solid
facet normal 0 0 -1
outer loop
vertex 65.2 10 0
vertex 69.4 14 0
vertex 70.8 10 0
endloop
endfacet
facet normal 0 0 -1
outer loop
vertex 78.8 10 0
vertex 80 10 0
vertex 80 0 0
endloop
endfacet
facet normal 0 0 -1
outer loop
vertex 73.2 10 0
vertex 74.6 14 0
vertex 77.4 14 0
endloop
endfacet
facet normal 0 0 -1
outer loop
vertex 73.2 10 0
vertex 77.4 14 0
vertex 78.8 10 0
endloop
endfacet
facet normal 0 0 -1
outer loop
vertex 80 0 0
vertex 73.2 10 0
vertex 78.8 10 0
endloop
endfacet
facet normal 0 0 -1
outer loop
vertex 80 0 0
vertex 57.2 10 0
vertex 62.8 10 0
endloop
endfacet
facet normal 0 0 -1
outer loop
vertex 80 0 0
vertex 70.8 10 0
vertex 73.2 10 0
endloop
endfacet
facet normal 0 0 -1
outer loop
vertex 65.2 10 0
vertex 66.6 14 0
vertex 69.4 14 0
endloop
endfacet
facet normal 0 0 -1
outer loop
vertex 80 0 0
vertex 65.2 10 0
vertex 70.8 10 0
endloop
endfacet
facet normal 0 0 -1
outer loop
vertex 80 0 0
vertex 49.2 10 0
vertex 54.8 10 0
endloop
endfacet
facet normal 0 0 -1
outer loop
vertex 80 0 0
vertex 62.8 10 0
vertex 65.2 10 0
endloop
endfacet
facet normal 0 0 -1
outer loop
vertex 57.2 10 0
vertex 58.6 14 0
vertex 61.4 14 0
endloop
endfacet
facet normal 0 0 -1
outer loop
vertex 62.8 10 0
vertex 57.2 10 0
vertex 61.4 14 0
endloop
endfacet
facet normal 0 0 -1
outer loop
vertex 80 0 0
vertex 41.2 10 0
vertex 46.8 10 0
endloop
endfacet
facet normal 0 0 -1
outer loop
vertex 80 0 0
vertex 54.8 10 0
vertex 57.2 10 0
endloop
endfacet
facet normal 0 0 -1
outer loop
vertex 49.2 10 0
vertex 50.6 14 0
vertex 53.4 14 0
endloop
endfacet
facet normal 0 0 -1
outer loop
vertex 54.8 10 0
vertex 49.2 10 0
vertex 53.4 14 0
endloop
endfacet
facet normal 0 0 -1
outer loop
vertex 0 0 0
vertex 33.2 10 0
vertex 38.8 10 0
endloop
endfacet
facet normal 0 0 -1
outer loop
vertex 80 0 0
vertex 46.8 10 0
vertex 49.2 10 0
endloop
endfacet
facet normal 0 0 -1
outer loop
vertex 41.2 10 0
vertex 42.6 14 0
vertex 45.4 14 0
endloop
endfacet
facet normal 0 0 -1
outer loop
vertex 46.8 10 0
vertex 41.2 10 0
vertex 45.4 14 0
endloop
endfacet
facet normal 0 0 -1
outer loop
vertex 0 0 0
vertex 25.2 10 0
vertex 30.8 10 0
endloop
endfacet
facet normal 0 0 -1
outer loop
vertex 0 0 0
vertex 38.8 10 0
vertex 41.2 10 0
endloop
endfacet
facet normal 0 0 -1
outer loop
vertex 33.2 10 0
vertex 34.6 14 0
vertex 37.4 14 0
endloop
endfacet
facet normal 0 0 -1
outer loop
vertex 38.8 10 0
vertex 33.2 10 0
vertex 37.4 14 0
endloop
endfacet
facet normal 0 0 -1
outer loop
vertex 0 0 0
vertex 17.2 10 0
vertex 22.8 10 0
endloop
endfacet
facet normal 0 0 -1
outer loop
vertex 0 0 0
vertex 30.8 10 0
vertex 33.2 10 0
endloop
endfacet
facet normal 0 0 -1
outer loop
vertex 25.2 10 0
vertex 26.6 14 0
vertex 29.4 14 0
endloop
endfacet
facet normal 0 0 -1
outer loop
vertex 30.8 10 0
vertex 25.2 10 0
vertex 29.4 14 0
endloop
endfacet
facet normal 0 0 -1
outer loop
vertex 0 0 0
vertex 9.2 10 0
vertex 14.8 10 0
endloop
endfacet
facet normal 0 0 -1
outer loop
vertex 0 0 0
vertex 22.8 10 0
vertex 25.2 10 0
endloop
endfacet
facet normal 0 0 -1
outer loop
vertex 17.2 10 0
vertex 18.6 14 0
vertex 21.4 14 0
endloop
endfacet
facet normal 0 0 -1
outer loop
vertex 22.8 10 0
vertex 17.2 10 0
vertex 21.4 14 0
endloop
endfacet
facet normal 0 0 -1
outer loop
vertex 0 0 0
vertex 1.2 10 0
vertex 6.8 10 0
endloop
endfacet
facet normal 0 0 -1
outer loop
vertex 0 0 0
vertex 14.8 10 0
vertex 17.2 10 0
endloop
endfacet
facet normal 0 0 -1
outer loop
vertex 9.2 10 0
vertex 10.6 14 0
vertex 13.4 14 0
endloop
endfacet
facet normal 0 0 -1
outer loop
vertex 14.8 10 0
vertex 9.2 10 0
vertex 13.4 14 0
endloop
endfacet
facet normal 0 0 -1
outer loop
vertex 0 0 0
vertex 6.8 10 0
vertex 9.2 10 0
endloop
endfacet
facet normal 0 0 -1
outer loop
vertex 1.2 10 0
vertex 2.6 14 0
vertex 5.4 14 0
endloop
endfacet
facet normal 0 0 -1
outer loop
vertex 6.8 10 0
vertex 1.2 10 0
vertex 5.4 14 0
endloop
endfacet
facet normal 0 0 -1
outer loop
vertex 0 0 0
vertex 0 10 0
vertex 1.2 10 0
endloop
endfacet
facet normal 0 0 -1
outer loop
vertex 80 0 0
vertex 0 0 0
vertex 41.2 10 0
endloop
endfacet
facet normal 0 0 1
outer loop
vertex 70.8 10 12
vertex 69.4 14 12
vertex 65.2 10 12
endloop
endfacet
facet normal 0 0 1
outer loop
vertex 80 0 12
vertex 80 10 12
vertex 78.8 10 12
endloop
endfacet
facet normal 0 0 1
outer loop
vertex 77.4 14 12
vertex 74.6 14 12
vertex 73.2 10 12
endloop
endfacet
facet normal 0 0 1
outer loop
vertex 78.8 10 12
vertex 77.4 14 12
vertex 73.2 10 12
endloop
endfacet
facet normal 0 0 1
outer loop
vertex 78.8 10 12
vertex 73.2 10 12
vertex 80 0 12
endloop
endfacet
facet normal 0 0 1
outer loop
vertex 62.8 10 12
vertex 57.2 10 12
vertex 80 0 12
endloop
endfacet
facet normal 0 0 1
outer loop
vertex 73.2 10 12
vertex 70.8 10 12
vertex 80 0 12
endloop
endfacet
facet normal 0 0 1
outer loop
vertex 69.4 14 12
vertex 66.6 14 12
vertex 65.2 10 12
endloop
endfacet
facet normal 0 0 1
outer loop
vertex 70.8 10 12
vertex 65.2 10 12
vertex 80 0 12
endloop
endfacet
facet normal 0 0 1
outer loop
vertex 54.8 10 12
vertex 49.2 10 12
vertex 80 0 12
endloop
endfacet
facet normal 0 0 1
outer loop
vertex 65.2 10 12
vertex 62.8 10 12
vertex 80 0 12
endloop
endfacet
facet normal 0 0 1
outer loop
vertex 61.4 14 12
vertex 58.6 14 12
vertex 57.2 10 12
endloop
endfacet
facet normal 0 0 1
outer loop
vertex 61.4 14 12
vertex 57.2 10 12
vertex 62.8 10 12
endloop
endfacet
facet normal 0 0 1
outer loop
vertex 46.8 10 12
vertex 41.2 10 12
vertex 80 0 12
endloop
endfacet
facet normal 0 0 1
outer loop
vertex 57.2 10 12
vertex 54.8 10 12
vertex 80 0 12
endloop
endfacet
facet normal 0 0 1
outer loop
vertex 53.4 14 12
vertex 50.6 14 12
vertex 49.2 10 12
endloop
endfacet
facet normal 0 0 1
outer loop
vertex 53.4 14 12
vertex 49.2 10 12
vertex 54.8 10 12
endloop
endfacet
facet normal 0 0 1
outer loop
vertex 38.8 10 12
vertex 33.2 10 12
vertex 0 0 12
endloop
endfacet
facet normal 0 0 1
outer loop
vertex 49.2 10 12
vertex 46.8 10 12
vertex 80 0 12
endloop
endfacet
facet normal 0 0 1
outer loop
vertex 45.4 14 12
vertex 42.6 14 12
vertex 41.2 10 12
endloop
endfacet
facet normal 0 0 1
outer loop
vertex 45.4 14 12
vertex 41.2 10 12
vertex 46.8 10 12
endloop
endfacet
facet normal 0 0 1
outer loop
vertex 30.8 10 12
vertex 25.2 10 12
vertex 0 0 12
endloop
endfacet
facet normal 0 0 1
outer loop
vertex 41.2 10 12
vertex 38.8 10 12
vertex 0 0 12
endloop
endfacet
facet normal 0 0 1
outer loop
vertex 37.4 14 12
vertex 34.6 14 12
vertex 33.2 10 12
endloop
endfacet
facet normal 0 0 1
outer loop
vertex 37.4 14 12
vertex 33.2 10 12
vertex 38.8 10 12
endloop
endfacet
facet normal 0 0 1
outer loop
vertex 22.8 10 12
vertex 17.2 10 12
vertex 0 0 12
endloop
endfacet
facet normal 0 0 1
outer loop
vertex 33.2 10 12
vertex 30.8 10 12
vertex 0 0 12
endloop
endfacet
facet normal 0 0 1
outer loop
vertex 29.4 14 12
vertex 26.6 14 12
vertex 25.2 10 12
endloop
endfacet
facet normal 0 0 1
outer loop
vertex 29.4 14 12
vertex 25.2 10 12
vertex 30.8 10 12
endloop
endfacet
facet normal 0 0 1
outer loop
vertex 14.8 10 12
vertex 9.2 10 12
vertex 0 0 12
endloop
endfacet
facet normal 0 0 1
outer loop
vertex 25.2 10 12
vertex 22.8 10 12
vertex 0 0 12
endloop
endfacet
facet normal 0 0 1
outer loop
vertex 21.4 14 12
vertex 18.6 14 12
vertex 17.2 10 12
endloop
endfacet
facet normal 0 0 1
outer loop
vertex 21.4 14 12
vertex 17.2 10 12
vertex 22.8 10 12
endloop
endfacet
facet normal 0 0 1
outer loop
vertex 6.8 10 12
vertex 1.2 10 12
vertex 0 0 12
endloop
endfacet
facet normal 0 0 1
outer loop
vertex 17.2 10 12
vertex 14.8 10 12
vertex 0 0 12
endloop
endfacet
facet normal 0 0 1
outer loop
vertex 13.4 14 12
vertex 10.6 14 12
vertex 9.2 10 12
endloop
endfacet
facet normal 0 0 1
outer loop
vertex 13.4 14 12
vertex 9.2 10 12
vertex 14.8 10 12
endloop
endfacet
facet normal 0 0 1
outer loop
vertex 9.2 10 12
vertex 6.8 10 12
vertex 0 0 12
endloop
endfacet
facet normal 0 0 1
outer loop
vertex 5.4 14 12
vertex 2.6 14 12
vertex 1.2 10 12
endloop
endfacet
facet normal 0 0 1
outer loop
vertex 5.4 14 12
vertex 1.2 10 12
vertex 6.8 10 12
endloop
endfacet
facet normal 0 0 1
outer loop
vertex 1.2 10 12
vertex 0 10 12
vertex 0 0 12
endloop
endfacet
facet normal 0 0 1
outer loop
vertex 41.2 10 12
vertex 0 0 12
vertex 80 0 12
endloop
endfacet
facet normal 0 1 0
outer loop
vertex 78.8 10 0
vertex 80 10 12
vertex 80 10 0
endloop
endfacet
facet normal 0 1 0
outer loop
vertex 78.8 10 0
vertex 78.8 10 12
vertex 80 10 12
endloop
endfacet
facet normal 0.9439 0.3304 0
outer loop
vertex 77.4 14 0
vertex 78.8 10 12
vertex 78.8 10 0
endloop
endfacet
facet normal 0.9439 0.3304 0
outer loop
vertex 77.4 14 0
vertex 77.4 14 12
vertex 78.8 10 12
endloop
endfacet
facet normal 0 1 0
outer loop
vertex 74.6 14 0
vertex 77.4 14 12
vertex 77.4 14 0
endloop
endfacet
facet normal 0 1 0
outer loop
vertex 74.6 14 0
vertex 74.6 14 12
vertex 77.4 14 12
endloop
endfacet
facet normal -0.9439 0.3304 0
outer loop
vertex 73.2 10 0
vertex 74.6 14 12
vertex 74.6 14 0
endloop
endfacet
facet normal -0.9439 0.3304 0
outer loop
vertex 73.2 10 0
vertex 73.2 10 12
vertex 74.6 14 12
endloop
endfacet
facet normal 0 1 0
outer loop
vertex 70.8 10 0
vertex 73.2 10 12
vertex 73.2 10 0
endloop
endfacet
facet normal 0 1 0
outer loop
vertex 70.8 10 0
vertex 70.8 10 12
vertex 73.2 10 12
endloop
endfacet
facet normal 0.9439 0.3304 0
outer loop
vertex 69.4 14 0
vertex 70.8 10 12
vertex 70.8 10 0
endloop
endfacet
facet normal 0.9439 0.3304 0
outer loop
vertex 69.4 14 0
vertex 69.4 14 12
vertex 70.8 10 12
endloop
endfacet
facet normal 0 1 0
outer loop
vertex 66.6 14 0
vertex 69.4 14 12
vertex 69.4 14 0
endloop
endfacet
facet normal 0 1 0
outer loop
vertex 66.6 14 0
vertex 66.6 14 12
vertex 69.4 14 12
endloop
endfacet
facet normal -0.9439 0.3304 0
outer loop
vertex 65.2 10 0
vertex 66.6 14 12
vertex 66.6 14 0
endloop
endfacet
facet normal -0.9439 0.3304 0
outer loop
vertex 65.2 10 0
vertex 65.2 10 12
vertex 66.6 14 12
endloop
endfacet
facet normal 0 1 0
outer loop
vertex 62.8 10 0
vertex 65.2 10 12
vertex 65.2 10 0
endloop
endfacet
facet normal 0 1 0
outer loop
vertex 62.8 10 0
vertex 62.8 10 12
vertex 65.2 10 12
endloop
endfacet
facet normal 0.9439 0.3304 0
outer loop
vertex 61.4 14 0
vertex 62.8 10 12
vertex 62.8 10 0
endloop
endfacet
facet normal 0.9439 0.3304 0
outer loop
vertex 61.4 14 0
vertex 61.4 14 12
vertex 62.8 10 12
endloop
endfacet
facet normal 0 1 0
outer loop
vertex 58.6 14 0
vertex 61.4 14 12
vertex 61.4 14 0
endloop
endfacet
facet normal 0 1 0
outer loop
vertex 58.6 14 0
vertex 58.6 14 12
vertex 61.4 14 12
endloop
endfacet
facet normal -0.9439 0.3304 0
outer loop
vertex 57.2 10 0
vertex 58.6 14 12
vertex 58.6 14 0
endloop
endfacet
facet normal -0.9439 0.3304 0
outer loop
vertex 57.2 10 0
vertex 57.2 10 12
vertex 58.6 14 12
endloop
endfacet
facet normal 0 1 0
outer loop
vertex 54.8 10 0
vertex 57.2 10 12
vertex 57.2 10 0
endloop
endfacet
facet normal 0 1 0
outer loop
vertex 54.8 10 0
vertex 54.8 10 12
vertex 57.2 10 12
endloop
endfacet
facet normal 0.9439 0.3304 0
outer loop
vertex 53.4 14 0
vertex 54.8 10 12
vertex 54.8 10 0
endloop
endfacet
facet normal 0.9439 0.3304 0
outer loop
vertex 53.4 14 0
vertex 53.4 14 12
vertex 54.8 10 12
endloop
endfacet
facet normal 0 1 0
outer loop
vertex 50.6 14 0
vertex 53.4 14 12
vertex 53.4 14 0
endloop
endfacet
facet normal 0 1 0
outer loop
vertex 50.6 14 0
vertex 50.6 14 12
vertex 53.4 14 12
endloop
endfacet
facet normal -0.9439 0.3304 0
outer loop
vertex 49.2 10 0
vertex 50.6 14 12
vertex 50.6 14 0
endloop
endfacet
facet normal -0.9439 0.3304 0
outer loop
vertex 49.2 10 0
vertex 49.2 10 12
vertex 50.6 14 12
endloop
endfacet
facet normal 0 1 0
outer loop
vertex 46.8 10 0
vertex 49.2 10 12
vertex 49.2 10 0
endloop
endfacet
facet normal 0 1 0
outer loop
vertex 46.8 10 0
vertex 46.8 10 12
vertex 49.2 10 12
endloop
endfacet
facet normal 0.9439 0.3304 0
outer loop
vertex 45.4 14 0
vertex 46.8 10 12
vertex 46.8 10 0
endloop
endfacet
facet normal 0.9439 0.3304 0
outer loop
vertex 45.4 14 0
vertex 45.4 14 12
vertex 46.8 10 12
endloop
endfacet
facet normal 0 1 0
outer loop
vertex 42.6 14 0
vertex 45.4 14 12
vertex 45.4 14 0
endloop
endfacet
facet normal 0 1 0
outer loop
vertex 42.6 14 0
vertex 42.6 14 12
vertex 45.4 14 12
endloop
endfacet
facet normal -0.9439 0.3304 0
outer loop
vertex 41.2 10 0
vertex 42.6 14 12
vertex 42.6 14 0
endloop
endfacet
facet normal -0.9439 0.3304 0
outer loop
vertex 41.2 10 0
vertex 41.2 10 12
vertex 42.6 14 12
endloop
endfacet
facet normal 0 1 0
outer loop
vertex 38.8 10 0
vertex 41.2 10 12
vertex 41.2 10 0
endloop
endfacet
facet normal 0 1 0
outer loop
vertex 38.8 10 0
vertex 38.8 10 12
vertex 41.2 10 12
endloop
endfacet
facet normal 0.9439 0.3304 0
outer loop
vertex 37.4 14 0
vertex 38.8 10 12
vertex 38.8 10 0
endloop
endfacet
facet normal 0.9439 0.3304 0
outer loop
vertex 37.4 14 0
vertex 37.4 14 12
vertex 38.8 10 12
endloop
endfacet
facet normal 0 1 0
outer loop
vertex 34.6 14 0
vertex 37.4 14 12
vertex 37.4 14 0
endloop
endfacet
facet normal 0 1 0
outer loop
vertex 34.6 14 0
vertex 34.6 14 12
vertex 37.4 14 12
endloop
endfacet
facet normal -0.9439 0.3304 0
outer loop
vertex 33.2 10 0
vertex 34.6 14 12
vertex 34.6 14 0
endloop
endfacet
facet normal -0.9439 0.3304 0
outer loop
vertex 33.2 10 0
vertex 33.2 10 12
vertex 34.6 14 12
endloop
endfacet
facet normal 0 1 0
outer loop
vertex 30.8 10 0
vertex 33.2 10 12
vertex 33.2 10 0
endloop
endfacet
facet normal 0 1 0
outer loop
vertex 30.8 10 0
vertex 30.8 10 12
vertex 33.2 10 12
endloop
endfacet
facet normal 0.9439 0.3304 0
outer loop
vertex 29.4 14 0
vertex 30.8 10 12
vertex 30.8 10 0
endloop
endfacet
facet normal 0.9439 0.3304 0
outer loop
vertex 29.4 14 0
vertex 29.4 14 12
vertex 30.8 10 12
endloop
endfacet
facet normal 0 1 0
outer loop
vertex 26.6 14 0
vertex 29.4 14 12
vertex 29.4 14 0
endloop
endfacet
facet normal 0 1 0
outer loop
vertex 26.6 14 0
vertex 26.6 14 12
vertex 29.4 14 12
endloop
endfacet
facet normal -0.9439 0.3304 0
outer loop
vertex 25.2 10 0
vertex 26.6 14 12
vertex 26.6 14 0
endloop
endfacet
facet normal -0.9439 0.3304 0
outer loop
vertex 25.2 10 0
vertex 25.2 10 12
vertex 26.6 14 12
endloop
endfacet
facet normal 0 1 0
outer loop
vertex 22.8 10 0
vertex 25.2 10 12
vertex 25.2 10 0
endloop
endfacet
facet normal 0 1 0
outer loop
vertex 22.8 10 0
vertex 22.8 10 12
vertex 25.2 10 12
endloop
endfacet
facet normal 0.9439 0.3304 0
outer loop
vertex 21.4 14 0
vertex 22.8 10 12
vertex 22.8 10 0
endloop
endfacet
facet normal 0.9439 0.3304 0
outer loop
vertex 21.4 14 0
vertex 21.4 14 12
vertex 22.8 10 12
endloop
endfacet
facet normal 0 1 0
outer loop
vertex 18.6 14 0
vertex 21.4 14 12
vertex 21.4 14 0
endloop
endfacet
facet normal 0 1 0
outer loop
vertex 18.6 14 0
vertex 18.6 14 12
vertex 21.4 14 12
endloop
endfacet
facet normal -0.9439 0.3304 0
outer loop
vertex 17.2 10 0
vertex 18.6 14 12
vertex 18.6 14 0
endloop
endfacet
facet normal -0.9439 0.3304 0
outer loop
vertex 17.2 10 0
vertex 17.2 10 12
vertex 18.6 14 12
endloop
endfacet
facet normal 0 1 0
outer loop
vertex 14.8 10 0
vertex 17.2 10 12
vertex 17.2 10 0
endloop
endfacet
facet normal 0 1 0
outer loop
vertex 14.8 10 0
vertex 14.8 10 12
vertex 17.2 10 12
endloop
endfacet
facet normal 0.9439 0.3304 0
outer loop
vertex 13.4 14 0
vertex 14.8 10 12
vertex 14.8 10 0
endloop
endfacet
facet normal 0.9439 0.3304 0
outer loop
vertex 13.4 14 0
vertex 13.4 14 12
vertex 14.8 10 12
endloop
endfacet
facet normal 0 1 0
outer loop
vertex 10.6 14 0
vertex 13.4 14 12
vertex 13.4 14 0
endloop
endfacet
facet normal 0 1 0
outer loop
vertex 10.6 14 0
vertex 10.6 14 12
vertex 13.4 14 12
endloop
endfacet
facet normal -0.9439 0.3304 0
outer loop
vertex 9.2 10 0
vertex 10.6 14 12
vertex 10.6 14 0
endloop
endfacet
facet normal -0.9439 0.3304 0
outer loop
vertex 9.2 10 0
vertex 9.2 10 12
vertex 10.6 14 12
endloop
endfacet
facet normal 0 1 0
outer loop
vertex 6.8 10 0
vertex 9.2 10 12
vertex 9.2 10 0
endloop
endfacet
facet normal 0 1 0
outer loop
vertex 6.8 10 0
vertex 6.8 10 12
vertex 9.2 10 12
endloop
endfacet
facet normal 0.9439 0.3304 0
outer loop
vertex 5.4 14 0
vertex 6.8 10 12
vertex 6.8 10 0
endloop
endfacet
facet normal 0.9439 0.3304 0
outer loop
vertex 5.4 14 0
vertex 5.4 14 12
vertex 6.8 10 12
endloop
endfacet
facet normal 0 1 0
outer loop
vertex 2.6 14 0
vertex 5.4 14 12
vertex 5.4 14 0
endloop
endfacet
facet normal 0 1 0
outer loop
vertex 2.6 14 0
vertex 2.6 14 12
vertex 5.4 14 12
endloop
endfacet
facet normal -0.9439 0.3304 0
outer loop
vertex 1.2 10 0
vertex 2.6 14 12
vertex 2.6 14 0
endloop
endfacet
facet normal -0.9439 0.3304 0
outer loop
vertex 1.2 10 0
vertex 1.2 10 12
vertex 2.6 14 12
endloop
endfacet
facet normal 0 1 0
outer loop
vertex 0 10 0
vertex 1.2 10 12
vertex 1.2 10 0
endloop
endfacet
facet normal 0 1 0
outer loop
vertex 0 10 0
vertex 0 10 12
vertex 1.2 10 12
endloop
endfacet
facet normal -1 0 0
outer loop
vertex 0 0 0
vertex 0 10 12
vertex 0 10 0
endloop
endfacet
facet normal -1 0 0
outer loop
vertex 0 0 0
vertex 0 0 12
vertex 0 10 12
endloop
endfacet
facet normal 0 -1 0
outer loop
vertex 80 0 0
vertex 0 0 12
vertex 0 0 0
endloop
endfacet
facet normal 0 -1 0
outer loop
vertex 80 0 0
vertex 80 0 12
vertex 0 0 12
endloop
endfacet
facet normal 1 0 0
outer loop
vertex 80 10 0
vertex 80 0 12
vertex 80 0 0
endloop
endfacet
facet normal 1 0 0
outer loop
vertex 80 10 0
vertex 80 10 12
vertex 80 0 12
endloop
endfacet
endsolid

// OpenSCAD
$fn = 32;

// ----------------------------------------------------------------------
// Gear rack: 10 teeth, pitch 8 mm
// ----------------------------------------------------------------------

// --- parameters (mm) ---
teeth = 10;               // number of teeth
pitch = 8;                // tooth pitch, X
root_w = 5.6;             // tooth width at the root
tip_w = 2.8;              // tooth width at the tip
base_h = 10;              // rack body height, Y
tooth_h = 4;              // tooth height above the body
plate_t = 12;             // rack width, Z (extrusion height)

rack_l = teeth * pitch;  // overall length
total_h = base_h + tooth_h;  // overall height

profile = [[0, 0], [80, 0], [80, 10], [78.8, 10], [77.4, 14], [74.6, 14], [73.2, 10], [70.8, 10], [69.4, 14], [66.6, 14], [65.2, 10], [62.8, 10], [61.4, 14], [58.6, 14], [57.2, 10], [54.8, 10], [53.4, 14], [50.6, 14], [49.2, 10], [46.8, 10], [45.4, 14], [42.6, 14], [41.2, 10], [38.8, 10], [37.4, 14], [34.6, 14], [33.2, 10], [30.8, 10], [29.4, 14], [26.6, 14], [25.2, 10], [22.8, 10], [21.4, 14], [18.6, 14], [17.2, 10], [14.8, 10], [13.4, 14], [10.6, 14], [9.2, 10], [6.8, 10], [5.4, 14], [2.6, 14], [1.2, 10], [0, 10]];  // primary outline, 44 points, counter clockwise

// --- the one profile operation ---
linear_extrude(height = plate_t) polygon(points = profile);
